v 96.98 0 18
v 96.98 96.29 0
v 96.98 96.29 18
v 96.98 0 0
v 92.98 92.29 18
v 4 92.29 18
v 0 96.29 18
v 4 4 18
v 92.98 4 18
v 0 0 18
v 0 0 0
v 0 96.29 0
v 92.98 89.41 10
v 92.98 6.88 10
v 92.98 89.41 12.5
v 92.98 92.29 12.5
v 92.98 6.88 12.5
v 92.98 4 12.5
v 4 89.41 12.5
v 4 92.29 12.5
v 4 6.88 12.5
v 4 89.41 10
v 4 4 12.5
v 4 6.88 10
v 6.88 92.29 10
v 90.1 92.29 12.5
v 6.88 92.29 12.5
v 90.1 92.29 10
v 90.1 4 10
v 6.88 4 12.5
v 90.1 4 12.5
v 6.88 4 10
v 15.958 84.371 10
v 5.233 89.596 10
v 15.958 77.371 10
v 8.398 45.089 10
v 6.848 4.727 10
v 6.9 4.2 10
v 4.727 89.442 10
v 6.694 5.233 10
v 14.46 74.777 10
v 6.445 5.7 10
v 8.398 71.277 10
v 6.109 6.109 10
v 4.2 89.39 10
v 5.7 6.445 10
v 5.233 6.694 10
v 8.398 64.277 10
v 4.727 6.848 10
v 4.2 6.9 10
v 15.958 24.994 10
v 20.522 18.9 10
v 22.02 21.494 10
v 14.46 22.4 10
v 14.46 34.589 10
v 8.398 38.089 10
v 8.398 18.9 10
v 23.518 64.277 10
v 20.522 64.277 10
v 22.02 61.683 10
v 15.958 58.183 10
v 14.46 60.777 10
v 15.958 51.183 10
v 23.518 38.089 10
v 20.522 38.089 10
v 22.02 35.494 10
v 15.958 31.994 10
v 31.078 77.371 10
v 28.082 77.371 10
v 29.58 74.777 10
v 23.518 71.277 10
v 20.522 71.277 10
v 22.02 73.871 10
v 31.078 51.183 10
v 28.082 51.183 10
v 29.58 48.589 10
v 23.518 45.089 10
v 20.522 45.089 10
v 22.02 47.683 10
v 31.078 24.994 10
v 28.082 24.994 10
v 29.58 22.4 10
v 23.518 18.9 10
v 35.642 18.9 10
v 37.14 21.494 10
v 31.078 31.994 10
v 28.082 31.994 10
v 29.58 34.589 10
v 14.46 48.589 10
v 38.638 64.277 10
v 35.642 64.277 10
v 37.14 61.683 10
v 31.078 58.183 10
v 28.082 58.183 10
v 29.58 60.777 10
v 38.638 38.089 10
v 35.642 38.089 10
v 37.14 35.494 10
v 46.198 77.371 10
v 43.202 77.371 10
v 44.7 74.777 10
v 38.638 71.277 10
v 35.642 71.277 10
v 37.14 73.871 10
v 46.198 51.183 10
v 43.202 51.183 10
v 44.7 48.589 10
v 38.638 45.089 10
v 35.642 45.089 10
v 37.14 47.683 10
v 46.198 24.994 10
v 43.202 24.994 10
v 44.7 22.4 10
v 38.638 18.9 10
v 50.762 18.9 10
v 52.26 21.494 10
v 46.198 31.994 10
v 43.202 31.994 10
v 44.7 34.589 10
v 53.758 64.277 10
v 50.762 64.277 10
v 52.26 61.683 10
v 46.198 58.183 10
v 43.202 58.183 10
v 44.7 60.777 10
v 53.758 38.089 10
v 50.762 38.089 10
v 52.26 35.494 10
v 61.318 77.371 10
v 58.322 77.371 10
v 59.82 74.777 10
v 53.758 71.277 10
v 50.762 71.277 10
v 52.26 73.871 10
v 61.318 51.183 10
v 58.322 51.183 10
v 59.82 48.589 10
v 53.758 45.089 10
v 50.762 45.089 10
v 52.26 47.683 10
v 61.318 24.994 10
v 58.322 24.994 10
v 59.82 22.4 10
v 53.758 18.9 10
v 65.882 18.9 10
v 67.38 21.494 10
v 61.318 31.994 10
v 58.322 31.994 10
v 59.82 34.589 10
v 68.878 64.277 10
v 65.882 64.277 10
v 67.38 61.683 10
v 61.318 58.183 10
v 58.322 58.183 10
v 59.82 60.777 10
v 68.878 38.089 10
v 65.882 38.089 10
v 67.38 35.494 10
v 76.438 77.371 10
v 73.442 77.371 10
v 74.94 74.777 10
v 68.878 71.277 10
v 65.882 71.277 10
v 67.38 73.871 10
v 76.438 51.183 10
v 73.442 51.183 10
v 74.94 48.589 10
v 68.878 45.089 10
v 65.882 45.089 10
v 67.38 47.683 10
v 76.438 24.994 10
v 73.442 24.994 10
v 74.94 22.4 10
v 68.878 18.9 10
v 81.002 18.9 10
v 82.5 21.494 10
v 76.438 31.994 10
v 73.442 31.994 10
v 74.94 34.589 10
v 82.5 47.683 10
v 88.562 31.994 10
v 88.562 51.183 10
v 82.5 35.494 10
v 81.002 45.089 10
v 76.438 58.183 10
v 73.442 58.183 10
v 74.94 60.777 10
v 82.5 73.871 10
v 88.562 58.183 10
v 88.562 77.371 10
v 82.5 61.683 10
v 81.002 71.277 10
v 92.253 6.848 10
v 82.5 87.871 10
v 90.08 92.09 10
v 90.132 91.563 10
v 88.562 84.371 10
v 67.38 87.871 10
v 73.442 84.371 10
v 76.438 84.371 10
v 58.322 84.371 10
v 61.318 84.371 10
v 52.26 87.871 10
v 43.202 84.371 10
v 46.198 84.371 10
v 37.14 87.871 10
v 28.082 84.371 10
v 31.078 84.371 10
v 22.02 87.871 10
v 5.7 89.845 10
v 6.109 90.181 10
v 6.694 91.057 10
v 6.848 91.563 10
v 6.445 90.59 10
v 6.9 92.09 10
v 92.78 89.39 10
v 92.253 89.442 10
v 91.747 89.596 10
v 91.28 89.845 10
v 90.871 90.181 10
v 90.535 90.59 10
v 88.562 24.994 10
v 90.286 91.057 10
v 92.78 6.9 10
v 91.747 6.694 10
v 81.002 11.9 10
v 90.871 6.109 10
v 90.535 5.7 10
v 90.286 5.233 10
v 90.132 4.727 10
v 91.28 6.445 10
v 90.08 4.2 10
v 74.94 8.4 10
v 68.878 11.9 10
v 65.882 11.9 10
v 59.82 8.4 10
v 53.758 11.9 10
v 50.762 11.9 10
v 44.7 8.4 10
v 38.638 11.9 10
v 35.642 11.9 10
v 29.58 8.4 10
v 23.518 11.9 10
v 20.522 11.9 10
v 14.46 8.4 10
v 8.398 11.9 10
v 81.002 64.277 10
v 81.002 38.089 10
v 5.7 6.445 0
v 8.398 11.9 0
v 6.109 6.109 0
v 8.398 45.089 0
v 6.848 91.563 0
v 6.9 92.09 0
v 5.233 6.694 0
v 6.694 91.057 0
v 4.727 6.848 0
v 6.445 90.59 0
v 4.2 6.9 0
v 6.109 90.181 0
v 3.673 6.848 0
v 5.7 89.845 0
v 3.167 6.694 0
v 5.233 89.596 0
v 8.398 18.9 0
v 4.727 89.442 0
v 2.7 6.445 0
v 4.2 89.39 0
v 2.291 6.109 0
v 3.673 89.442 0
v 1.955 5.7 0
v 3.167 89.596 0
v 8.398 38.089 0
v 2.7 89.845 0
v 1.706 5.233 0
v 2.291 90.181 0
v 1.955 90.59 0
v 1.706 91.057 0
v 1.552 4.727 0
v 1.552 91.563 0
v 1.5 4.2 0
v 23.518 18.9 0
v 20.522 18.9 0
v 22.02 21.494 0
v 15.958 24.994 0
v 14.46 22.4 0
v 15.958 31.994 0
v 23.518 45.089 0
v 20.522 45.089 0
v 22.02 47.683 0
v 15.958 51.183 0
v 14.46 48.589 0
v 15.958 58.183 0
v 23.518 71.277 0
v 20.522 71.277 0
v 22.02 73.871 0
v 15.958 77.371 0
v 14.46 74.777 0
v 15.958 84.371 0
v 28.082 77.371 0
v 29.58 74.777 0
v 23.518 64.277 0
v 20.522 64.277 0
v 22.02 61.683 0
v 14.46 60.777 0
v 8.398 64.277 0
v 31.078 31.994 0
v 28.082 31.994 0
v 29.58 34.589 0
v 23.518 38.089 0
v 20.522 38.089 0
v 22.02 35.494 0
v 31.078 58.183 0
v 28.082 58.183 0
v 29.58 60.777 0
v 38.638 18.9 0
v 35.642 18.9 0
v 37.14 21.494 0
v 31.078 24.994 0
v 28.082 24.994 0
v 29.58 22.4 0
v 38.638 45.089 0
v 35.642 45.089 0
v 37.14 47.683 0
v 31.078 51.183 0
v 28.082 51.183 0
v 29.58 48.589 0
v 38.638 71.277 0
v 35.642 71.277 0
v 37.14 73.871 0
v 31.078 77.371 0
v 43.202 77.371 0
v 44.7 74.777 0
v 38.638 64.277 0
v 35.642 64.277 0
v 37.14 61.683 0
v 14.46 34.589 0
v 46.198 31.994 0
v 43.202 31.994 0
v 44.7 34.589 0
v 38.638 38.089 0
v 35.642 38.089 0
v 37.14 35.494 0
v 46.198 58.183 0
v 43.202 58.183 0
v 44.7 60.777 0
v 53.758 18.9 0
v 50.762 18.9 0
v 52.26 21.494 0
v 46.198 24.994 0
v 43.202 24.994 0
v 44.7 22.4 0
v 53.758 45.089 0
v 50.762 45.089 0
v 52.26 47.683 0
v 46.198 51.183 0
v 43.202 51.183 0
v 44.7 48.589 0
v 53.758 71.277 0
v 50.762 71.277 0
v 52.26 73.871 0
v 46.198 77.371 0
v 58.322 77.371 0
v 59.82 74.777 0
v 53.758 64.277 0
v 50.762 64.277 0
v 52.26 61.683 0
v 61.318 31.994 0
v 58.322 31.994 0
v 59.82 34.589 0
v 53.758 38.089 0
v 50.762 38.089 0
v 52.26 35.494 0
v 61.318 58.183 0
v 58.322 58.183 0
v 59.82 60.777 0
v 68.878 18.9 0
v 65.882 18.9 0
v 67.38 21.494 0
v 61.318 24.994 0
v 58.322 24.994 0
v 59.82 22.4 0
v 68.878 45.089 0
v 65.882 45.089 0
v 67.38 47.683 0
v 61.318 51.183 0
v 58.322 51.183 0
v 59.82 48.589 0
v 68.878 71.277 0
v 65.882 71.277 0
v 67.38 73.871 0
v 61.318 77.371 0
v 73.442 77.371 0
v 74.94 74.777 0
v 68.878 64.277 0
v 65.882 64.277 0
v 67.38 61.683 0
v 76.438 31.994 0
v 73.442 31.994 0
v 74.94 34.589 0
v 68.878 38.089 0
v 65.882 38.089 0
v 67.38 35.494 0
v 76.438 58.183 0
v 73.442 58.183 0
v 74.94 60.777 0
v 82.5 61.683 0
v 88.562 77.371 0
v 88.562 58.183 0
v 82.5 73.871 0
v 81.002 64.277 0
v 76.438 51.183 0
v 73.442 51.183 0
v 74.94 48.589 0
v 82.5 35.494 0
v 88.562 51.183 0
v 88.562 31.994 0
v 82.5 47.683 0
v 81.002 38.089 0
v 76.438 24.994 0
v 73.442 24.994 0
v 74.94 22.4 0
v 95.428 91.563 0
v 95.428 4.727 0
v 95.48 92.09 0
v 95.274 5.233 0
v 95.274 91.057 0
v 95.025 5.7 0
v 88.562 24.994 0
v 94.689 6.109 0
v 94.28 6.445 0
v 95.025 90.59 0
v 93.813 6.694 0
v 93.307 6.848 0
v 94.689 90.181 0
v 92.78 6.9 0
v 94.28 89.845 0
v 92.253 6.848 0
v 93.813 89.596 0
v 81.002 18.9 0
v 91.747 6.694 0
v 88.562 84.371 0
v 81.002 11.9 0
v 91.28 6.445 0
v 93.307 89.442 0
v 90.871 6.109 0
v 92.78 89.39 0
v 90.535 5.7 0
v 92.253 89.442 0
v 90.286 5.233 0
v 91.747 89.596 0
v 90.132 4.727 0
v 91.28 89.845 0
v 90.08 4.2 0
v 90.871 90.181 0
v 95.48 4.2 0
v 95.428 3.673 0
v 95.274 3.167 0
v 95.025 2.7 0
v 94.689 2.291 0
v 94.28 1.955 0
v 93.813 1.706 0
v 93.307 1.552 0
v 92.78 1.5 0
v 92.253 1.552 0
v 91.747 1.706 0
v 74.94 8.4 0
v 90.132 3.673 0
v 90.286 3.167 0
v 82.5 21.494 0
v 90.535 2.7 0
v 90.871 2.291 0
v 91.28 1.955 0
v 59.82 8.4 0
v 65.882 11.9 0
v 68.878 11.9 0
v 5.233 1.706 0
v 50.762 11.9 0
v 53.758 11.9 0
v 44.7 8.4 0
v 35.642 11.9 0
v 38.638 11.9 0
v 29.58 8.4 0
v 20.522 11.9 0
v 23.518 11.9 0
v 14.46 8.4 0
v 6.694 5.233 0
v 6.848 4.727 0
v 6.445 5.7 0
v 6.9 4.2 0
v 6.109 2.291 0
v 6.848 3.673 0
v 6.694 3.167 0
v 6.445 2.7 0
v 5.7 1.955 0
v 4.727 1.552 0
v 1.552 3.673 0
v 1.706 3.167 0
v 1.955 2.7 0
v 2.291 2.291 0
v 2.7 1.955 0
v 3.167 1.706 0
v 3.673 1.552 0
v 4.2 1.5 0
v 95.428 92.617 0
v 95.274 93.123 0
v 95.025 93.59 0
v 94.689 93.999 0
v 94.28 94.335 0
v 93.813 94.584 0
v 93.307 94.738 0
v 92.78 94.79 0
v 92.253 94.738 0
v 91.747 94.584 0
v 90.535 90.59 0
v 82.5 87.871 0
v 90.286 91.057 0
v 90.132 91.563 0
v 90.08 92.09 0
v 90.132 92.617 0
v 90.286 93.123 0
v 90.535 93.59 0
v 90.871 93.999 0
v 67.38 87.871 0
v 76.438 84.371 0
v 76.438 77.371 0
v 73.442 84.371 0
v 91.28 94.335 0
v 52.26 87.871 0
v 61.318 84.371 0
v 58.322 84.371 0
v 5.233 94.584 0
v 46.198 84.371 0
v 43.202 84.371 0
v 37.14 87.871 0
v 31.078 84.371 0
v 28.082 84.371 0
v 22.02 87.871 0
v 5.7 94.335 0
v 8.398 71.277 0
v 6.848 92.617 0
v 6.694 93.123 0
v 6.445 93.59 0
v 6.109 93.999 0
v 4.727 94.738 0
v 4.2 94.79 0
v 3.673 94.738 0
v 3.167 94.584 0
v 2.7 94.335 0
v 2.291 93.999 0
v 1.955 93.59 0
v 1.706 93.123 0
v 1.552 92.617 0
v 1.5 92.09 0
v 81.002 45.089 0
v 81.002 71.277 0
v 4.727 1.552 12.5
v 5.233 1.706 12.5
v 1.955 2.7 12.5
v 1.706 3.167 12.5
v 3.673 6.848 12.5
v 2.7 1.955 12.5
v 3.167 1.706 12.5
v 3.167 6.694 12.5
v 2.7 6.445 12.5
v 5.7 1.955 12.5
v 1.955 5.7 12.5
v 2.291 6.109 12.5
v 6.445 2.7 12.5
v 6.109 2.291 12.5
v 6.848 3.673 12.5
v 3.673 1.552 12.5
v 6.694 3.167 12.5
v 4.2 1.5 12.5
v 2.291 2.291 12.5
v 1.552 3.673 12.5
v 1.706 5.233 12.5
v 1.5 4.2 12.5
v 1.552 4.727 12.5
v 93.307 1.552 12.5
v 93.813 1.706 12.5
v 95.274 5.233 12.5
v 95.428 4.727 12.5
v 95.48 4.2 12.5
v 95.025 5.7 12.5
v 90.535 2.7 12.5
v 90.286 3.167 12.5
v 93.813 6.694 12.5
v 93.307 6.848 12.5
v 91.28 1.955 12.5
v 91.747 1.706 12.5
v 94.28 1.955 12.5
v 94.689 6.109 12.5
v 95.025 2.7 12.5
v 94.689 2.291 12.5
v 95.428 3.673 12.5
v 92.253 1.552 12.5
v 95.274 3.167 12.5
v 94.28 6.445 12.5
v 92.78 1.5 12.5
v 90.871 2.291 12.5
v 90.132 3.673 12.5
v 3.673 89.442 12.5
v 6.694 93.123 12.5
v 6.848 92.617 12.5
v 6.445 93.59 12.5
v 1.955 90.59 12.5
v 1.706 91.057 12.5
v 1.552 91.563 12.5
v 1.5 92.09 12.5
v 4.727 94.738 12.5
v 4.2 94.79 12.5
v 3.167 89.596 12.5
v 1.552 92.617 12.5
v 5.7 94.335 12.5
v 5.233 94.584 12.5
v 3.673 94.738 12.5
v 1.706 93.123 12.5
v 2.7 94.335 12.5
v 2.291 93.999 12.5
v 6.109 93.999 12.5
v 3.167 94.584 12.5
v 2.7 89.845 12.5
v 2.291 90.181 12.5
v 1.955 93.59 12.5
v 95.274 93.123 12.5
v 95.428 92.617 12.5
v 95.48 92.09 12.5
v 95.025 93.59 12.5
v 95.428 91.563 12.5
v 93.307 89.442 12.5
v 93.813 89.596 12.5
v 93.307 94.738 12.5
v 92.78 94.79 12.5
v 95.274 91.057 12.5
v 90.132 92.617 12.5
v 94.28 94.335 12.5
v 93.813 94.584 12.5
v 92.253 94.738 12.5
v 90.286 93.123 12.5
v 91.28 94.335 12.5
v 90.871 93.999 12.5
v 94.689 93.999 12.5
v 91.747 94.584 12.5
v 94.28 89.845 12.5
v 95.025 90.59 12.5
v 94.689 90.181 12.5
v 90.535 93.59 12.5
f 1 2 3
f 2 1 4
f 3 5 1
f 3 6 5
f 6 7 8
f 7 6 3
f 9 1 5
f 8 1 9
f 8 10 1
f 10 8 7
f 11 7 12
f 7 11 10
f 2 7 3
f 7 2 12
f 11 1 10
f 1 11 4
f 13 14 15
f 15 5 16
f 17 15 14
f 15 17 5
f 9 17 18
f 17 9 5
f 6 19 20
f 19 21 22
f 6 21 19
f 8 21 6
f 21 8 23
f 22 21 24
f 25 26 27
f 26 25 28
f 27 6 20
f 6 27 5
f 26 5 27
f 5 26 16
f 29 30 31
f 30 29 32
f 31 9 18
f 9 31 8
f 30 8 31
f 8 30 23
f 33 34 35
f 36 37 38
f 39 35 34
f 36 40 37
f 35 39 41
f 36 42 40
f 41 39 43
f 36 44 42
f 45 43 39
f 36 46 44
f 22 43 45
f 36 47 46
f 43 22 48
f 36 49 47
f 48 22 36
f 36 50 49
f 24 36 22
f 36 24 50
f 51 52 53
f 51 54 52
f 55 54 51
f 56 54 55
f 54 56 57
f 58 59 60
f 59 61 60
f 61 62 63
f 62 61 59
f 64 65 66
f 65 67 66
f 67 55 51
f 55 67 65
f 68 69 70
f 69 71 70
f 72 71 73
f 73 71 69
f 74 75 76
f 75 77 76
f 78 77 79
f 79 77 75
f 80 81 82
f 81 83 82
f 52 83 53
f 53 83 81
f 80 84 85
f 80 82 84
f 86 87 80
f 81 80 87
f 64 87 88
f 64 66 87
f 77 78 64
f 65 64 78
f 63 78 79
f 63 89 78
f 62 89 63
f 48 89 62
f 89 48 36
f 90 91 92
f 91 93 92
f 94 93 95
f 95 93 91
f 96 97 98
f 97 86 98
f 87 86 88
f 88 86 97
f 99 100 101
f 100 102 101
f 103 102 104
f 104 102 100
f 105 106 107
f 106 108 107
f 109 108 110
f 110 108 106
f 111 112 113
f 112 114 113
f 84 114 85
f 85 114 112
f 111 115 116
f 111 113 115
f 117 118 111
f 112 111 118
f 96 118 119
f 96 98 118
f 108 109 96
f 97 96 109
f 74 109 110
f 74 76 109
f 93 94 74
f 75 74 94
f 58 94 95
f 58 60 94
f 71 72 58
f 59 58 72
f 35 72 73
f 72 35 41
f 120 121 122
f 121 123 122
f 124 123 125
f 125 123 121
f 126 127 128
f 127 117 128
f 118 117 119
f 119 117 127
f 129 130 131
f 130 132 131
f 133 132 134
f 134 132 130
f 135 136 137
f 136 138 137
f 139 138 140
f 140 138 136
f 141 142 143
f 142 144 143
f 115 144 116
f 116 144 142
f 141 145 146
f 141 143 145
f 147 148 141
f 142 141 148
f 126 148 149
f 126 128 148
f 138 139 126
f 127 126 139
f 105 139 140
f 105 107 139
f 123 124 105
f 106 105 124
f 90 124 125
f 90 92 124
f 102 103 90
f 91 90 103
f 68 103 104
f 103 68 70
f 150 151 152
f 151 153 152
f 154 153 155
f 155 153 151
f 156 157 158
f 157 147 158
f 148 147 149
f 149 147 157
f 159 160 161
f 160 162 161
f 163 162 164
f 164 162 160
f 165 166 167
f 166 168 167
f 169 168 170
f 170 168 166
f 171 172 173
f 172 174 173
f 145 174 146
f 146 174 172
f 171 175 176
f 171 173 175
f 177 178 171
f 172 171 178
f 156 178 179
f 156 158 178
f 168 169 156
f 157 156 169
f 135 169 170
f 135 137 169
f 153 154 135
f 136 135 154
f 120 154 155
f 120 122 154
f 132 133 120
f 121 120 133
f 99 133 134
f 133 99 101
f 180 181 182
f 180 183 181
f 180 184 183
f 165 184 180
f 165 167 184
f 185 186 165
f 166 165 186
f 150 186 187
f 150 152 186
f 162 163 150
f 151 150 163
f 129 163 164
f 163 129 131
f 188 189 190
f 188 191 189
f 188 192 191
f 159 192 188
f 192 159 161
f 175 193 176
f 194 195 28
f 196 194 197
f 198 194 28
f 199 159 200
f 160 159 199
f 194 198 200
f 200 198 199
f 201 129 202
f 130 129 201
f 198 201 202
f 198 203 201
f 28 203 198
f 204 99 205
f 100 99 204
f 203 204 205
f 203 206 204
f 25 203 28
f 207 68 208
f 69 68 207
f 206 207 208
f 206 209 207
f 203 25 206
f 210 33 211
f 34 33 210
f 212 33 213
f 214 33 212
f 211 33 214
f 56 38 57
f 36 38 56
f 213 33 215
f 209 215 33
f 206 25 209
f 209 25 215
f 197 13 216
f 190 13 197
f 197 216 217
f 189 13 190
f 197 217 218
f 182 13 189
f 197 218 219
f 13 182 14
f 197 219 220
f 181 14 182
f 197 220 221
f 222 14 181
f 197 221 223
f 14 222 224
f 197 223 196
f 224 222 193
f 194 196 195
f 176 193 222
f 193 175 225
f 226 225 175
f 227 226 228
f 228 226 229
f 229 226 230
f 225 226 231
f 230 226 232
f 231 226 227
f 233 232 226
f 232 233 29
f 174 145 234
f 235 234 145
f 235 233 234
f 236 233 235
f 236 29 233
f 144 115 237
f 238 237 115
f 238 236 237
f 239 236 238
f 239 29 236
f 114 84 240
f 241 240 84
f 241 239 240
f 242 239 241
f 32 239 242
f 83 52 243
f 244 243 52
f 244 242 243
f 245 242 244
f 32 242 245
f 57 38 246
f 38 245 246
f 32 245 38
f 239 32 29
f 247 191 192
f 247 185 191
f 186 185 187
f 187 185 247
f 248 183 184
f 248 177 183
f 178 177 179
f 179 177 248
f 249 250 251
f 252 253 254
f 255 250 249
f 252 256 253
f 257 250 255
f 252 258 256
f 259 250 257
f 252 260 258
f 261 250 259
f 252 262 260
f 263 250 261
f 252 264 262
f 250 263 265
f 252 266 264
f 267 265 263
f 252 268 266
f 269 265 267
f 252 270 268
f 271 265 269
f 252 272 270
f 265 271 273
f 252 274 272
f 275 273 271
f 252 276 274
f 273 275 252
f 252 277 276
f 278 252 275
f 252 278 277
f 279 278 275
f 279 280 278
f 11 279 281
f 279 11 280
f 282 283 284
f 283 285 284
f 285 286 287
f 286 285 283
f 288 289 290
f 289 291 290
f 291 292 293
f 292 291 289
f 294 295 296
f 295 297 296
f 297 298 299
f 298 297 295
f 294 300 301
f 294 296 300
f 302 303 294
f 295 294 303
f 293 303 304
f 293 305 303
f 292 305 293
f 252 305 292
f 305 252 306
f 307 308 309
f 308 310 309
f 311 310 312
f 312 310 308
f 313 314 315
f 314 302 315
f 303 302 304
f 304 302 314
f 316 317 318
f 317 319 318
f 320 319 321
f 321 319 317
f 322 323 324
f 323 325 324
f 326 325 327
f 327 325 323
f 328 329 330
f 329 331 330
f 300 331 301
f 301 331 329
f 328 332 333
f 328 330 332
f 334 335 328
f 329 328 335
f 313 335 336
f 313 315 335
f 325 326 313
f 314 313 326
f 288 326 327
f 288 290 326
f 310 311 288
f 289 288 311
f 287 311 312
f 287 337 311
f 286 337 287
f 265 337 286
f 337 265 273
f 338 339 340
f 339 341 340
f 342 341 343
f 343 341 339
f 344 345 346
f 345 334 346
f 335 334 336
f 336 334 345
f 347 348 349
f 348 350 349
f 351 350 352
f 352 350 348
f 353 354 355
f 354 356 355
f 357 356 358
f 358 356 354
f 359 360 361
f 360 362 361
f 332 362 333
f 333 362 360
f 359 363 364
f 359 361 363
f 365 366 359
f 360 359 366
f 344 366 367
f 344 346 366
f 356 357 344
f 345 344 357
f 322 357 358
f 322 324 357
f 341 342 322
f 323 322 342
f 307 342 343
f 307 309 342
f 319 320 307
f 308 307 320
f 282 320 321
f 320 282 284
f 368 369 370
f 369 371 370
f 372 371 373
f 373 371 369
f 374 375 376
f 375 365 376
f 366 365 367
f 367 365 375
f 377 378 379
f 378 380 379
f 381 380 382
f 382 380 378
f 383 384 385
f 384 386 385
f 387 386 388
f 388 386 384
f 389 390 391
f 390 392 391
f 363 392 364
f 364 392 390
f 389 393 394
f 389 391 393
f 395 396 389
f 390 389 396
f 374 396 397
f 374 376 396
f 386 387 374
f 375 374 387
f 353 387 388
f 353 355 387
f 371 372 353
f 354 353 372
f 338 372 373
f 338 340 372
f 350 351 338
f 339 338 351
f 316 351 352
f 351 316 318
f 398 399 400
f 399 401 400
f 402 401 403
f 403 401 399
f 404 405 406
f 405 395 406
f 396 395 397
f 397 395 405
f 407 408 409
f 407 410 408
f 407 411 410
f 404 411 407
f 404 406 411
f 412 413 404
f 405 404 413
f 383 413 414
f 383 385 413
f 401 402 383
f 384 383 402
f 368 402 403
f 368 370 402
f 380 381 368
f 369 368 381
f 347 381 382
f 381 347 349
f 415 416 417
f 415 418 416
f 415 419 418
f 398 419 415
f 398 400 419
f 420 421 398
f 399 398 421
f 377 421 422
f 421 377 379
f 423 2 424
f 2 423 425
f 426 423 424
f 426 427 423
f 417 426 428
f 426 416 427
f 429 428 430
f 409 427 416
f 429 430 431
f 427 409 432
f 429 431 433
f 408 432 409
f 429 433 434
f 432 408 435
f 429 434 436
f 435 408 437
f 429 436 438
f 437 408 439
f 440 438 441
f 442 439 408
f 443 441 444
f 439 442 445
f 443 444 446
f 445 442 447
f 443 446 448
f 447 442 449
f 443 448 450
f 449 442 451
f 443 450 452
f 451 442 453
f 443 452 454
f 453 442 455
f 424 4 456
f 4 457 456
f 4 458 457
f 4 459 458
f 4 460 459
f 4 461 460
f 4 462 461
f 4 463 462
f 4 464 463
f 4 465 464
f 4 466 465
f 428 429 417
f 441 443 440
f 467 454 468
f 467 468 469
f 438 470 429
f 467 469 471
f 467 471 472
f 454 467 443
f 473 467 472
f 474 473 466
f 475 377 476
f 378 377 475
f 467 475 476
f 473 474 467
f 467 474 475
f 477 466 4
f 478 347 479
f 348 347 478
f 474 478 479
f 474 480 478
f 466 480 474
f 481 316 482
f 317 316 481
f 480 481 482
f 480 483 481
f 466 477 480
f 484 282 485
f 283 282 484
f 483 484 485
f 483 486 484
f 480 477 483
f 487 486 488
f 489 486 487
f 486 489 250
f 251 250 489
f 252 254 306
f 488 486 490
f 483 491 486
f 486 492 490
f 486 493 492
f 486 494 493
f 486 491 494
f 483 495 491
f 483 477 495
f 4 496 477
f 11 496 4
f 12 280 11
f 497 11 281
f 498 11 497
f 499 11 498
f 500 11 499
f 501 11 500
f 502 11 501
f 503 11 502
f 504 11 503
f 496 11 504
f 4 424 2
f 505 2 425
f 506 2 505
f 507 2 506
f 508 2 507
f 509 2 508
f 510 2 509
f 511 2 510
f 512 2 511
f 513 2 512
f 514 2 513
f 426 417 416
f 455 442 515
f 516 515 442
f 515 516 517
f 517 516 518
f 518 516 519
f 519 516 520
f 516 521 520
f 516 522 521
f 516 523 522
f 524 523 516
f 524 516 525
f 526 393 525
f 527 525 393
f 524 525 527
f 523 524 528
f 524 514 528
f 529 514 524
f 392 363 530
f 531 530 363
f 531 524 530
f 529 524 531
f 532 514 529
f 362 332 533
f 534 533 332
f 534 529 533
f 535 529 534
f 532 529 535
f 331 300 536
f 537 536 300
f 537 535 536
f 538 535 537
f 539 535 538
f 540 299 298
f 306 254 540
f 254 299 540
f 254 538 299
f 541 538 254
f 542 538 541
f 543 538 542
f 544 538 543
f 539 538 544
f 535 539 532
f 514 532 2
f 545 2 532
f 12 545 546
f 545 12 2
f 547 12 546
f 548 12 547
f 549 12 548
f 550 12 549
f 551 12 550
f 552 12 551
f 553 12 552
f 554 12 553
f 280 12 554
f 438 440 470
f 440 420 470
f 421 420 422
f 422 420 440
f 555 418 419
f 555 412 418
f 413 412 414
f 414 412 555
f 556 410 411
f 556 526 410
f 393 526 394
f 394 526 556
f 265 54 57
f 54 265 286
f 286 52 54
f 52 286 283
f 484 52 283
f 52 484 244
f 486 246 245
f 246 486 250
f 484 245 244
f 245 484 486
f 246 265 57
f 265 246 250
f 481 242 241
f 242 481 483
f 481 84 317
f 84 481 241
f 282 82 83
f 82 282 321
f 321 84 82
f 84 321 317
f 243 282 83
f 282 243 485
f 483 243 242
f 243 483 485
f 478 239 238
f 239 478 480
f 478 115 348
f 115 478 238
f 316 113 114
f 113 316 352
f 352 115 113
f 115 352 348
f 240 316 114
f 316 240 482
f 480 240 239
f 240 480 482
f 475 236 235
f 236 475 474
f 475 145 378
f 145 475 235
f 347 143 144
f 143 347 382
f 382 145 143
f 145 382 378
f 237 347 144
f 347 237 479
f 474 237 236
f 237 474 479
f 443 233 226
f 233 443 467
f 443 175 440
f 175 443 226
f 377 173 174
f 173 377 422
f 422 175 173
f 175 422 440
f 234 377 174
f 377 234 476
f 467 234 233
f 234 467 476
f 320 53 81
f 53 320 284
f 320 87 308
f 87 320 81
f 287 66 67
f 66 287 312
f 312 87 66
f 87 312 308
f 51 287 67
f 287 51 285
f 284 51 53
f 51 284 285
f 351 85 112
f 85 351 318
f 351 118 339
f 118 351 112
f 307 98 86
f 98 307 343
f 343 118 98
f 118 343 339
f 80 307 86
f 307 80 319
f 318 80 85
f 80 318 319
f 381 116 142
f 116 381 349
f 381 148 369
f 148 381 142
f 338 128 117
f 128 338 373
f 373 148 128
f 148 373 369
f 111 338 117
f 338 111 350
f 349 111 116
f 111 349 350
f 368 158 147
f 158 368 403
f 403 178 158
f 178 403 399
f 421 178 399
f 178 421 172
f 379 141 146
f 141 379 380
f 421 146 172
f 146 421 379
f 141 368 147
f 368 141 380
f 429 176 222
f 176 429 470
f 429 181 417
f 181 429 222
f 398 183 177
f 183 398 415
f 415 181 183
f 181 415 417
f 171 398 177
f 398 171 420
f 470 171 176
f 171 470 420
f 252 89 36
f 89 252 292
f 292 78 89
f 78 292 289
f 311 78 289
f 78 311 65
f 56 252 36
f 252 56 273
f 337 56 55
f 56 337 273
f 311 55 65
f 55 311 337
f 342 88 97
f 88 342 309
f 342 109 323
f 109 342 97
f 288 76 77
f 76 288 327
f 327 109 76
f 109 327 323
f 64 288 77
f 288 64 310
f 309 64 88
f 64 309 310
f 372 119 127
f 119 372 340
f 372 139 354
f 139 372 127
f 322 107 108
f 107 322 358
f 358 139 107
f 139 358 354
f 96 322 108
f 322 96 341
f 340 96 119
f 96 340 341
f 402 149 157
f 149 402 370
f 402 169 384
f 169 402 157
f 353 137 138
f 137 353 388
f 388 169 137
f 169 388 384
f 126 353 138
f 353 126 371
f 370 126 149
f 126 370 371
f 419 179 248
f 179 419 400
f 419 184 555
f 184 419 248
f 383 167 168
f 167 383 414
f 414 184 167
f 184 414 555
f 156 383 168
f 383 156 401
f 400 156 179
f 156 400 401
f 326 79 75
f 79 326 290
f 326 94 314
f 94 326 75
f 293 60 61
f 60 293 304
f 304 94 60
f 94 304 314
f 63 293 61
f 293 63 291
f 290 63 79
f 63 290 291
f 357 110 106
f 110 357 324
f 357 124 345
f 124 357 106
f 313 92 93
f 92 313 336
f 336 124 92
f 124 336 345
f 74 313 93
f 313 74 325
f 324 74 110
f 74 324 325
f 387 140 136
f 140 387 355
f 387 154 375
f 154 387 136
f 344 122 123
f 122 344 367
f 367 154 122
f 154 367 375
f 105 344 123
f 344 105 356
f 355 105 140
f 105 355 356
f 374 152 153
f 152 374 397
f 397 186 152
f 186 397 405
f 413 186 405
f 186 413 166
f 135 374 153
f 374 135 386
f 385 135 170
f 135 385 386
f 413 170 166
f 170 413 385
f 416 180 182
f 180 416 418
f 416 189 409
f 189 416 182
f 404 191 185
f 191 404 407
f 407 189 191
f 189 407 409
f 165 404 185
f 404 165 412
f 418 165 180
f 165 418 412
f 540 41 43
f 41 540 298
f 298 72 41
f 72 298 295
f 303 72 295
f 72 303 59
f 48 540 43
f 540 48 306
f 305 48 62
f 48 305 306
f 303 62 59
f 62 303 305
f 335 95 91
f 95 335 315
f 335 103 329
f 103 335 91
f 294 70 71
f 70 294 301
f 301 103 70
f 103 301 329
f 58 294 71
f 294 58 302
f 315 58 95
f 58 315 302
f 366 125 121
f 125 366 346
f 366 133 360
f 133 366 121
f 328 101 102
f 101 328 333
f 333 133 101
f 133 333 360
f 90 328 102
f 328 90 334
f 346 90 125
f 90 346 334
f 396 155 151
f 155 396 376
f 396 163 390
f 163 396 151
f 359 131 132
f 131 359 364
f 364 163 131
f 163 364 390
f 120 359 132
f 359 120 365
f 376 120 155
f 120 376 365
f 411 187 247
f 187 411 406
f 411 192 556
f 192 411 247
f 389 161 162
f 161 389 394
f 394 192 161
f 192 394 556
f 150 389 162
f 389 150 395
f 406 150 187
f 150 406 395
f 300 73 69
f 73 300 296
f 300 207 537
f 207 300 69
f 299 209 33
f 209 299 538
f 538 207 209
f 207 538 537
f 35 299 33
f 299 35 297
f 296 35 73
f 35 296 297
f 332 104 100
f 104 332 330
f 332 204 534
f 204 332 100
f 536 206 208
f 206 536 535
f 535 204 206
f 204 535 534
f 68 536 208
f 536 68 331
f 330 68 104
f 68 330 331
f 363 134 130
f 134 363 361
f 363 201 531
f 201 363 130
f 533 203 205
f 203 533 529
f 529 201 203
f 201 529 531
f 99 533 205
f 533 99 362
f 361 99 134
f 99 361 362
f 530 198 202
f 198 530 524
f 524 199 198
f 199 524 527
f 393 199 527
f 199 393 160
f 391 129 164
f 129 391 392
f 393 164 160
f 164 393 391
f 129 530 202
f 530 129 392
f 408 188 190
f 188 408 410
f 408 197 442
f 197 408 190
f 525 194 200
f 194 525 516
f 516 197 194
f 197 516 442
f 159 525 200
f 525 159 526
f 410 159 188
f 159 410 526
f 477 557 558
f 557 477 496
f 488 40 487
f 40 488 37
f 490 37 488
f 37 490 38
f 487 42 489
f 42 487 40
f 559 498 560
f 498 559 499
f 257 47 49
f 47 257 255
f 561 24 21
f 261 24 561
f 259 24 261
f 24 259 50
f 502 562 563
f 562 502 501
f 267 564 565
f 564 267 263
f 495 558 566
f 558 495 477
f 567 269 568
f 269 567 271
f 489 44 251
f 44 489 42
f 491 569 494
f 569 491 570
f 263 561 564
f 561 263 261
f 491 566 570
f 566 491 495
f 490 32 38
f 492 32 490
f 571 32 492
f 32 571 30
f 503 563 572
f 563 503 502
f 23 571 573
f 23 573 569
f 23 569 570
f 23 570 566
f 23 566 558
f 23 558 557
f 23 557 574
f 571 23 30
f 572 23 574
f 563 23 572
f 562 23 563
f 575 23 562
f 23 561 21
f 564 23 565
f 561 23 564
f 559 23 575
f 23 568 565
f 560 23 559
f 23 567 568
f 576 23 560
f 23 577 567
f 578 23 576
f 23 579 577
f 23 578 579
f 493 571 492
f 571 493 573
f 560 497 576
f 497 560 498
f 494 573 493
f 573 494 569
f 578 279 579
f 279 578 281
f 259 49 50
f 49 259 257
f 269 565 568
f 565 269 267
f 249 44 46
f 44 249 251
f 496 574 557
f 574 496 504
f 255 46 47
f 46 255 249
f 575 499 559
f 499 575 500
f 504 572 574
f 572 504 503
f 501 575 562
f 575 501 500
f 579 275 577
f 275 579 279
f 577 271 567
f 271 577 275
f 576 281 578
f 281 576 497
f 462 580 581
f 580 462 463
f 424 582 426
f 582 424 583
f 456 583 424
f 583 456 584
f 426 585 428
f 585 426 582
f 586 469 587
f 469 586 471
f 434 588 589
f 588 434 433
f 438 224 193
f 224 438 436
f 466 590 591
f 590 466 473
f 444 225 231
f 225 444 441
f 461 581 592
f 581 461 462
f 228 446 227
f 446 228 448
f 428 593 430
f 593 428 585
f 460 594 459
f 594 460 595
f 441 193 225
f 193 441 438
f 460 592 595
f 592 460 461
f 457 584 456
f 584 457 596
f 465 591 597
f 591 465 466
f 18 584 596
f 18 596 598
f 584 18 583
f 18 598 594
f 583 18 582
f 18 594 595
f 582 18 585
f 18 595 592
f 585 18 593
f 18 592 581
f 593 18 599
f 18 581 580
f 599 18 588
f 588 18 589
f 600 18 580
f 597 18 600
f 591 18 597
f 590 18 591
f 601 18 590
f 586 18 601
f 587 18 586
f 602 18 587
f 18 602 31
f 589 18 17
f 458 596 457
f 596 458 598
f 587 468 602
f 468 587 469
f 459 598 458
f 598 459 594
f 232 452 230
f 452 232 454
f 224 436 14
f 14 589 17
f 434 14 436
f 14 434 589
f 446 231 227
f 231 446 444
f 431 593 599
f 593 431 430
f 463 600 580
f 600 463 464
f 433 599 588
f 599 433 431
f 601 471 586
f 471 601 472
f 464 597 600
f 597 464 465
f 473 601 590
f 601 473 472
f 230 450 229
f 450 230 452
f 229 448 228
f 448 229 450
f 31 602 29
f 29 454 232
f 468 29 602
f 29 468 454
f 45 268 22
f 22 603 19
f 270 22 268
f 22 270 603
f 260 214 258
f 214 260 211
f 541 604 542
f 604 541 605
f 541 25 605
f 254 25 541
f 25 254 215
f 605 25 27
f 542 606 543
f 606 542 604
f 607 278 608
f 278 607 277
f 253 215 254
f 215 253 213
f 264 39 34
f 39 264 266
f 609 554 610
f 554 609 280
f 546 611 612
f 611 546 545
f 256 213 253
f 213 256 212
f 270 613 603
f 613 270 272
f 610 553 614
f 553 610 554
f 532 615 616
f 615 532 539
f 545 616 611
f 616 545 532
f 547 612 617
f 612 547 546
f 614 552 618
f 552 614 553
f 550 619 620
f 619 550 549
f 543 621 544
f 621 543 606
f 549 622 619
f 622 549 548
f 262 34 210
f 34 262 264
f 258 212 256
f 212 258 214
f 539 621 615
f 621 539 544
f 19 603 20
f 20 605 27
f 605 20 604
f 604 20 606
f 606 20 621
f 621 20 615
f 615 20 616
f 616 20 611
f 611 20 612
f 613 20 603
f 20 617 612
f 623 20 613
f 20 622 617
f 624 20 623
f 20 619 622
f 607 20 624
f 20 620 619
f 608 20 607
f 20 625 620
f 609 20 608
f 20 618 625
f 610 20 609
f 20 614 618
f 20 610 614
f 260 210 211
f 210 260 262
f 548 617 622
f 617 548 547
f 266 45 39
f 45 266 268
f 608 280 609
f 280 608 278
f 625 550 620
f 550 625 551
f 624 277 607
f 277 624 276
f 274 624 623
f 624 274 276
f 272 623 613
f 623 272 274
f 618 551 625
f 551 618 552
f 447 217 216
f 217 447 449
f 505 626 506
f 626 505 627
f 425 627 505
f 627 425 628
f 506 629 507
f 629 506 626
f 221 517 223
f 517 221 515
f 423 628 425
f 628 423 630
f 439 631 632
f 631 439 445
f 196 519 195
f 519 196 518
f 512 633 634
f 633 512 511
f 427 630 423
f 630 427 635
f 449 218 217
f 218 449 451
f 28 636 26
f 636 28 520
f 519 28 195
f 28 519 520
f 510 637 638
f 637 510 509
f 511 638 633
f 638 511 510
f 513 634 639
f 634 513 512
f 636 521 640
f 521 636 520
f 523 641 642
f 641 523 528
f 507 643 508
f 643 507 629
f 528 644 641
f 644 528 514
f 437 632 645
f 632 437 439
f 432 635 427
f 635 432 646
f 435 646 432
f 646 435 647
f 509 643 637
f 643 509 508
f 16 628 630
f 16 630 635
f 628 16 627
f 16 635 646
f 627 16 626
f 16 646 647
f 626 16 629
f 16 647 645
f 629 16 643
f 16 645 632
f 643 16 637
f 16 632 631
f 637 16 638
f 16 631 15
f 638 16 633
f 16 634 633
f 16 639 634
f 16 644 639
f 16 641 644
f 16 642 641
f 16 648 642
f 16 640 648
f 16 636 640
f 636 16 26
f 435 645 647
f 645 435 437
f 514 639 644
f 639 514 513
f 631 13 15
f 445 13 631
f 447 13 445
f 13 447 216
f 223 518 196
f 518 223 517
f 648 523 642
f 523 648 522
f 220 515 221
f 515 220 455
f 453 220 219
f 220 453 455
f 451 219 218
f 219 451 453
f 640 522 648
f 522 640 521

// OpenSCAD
$fn = 32;

// ----------------------------------------------------------------------
// Honeycomb panel: 96.98 x 96.29 mm, 30 cells of 14 mm
// ----------------------------------------------------------------------

// --- parameters (mm) ---
panel_w = 96.98;          // panel width
panel_d = 96.29;          // panel depth
thick = 10;               // panel thickness
cell_r = 7;               // hex cell circumradius
pitch = 15.12;            // hex cell pitch (centre to centre)
web = 3;                  // web between the cells
columns = 5;              // columns of cells
rows = 6;                 // rows of cells
cell_count = 30;          // total cells
shift_x = 14.46;          // first cell offset in x
shift_y = 15.4;           // first cell offset in y
mount_d = 5.4;            // corner mounting holes
hole_off = 4.2;           // mounting hole offset from the corners
rim_h = 18;               // rim height
rim_t = 4;                // rim wall thickness

difference() {
  union() {
    cube([panel_w, panel_d, thick]);
    /* rim around the panel, sunk 1 mm into the plate */
    translate([0, 0, thick - 1]) difference() {
      cube([panel_w, panel_d, rim_h - thick + 1]);
      translate([rim_t, rim_t, -2.5]) cube([panel_w - 2 * rim_t, panel_d - 2 * rim_t, rim_h - thick + 6]);
    }
  }
  /* hexagonal cells, point-up, cut right through the plate */
  for (row = [0 : rows - 1]) {
    for (col = [0 : columns - 1]) {
      translate([shift_x + col * pitch + (row % 2) * pitch / 2, shift_y + row * pitch * 0.866025, -2.5]) rotate([0, 0, 30]) cylinder(h = thick + 5, d = 2 * cell_r, $fn = 6);
    }
  }
  /* corner mounting holes, clear of the outer cell web */
  translate([4.2, 4.2, -2.5]) cylinder(h = thick + 5, d = mount_d);
  translate([92.78, 4.2, -2.5]) cylinder(h = thick + 5, d = mount_d);
  translate([4.2, 92.09, -2.5]) cylinder(h = thick + 5, d = mount_d);
  translate([92.78, 92.09, -2.5]) cylinder(h = thick + 5, d = mount_d);
}
